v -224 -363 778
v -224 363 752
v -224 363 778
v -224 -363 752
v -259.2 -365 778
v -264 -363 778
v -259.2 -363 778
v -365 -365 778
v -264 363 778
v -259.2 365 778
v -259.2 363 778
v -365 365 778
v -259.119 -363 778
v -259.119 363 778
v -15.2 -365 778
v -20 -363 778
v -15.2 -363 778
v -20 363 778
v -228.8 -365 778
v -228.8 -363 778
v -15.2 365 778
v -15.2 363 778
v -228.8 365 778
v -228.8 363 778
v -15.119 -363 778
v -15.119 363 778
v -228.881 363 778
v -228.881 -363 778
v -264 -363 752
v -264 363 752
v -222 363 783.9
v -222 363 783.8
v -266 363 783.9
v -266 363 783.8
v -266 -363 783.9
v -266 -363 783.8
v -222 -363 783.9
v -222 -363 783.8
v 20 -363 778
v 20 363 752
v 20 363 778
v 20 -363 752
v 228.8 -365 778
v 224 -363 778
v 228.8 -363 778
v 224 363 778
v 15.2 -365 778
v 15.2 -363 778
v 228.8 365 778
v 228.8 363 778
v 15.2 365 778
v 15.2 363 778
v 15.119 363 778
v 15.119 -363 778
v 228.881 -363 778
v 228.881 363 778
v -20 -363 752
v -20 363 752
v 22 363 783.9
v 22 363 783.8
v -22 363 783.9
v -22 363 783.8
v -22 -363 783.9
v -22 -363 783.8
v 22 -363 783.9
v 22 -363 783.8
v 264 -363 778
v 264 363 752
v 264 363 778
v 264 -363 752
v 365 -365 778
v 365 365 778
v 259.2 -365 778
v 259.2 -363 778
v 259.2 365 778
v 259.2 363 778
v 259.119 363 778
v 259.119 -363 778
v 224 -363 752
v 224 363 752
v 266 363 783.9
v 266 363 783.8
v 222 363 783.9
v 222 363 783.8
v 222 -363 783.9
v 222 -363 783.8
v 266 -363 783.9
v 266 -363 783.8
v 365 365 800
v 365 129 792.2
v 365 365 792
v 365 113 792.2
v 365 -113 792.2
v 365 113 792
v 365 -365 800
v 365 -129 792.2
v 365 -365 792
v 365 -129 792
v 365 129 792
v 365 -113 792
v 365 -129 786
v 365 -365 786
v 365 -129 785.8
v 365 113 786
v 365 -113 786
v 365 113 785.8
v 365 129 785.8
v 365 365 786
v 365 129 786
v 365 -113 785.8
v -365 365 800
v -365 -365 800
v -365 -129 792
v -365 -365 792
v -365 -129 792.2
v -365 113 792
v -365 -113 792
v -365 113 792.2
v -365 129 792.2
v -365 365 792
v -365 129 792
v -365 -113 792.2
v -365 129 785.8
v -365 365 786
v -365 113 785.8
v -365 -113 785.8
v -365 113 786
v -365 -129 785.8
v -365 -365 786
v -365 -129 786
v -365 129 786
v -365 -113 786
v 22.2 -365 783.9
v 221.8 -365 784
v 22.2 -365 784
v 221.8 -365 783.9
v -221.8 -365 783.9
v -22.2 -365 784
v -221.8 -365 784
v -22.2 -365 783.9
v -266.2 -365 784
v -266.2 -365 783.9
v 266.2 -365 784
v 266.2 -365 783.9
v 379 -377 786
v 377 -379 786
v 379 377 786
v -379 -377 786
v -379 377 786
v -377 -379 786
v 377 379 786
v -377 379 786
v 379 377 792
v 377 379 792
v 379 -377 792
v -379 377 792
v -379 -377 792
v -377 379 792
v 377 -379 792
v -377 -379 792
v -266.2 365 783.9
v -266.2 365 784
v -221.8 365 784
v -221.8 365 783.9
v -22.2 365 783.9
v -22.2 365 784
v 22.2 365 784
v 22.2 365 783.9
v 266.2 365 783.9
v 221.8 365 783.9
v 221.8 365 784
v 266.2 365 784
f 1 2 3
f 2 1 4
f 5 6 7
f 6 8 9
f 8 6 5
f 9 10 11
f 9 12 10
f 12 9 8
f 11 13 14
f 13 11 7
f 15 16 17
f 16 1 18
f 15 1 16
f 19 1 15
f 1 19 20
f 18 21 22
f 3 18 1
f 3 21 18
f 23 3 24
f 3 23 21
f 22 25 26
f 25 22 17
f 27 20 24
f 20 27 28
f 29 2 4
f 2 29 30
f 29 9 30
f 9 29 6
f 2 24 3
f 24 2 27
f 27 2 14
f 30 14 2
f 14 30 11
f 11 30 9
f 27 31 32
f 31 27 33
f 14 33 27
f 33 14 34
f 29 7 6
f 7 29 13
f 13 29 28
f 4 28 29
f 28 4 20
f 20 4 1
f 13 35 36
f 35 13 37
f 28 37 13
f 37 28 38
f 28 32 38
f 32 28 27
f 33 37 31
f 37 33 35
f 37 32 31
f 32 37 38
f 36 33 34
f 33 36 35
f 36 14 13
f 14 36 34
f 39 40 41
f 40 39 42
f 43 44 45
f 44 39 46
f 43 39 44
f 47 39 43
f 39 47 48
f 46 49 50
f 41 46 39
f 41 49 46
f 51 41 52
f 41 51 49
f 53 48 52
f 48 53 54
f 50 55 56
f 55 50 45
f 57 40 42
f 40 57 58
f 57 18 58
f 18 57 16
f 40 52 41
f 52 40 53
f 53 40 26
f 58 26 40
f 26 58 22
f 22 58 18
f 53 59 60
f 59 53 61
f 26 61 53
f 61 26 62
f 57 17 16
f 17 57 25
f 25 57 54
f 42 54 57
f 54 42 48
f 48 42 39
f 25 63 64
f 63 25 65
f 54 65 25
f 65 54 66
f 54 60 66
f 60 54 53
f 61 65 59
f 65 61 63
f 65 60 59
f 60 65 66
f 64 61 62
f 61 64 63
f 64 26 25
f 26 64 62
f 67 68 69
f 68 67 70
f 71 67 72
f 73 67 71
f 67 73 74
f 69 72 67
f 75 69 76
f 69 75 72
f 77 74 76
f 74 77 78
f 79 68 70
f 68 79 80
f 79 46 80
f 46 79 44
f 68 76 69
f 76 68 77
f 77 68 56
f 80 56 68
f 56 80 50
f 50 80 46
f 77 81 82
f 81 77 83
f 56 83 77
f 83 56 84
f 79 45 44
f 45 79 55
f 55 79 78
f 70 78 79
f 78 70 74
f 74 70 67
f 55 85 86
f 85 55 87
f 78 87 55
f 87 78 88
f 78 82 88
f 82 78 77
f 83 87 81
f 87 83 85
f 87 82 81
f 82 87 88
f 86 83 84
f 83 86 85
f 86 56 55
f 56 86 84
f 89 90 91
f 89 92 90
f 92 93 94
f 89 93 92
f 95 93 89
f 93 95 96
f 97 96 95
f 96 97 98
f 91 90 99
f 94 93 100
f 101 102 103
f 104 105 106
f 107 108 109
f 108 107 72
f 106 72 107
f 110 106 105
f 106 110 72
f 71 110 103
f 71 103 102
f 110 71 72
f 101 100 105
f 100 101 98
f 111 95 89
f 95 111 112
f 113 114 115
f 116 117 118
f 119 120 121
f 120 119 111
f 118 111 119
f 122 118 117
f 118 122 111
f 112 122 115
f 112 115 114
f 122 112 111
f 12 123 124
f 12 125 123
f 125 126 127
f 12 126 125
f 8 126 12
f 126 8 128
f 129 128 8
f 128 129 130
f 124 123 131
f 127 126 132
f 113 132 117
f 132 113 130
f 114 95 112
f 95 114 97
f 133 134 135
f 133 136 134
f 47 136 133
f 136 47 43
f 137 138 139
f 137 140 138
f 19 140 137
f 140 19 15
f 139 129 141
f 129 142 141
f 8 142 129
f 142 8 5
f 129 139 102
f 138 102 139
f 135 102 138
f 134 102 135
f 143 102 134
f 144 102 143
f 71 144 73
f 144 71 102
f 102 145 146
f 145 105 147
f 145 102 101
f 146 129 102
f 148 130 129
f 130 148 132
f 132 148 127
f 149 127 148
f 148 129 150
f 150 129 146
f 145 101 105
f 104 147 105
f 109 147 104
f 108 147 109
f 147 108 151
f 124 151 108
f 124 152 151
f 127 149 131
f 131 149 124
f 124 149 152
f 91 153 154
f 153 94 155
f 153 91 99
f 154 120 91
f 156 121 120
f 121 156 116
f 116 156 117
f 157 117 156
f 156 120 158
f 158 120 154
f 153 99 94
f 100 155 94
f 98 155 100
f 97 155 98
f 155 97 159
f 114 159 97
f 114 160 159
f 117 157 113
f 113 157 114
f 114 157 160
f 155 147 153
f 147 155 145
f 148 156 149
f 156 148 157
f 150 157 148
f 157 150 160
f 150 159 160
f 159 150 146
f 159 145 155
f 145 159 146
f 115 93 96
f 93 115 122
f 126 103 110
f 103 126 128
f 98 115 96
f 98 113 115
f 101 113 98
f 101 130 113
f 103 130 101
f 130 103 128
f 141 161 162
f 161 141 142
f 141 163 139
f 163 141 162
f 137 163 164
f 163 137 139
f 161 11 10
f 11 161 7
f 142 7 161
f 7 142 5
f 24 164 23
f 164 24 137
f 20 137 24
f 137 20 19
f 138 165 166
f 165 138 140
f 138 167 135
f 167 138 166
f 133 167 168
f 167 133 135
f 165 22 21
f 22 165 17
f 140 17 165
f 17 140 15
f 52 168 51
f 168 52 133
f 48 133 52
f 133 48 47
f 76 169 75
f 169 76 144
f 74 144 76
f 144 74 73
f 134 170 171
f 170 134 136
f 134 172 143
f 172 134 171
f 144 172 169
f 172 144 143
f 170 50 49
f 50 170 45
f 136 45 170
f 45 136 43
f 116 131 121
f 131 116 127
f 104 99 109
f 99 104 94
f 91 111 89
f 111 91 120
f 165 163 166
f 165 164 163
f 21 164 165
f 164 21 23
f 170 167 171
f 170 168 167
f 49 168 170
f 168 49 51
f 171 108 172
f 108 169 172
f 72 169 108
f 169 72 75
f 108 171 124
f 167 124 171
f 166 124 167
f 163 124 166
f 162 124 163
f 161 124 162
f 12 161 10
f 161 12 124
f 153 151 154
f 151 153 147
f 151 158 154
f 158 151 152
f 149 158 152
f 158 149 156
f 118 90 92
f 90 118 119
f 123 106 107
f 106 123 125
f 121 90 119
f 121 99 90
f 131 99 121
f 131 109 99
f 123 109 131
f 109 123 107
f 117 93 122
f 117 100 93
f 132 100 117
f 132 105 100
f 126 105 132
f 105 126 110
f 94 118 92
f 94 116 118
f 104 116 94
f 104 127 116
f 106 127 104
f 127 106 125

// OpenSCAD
// file: parts.scad
$fn=40;

// ---- 桌腿 ----

module leg(){
  difference(){
    union(){
      translate([390.000,390.000,0.000]) cube([60.000,60.000,750.000]);
      translate([400.000,400.000,750.000]) cube([40.000,40.000,20.000]);
    }
    // 牙板透榫槽（沿 +x，+y 侧牙板 A 端穿入）
    translate([389.000,426.800,699.800]) cube([62.000,14.400,40.400]);
    // 牙板闷榫槽（沿 +y，+x 侧牙板 B 端）
    translate([426.800,389.000,699.800]) cube([14.400,23.200,40.400]);
  }
}

// ---- 边框 ----

module rail(){
  difference(){
    union(){
      translate([0,0,750]) linear_extrude(height=50) polygon(points=[[-370,370],[370,370],[450.0,450.0],[-450.0,450.0]]);
      translate([420.607,399.393,779.0]) rotate([0,0,-45]) cube([34,40,10],center=true);
    }
    // 面板槽：全长开通至 45° 端面（角部两框的槽合起来成 L 形）
    translate([-450.000,370.000,785.800]) cube([900.000,14.000,6.400]);
    // 腿顶榫卯（两端各半，合起来 40x40x20）
    translate([399.800,399.800,750.000]) cube([40.400,40.400,20.400]);
    translate([-440.200,399.800,750.000]) cube([40.400,40.400,20.400]);
    // 格角暗榫卯
    translate([-398.545,421.455,779.0]) rotate([0,0,45]) cube([34.4,40.4,10.4],center=true);
    // 竹销孔：+x 端穿暗榫，-x 端穿本体
    translate([418,384,750]) cylinder(h=34,r=4.0,$fn=40);
    translate([-384,418,750]) cylinder(h=34,r=4.0,$fn=40);
  }
}

// ---- 牙板 ----

module apron(){
  difference(){
    union(){
      translate([-390.000,424.000,680.000]) cube([780.000,20.000,70.000]);
      // A 端：透榫（390..460）
      translate([390.000,427.000,700.000]) cube([70.000,14.000,40.000]);
      // B 端：闷榫（-412..-390）
      translate([-412.000,427.000,700.000]) cube([22.000,14.000,40.000]);
    }
    hull(){ translate([375.000,423.500,680.000]) cube([15.000,21.000,0.200]); translate([389.800,423.500,680.000]) cube([0.200,21.000,15.000]); }
    hull(){ translate([-390.000,423.500,680.000]) cube([15.000,21.000,0.200]); translate([-390.000,423.500,680.000]) cube([0.200,21.000,15.000]); }
    // 透榫楔槽（横槽，撑开榫头上下两片）
    translate([428.000,426.900,718.400]) cube([32.200,14.200,3.200]);
  }
}

// ---- 面板-边板 ----

module panel_outer(){
  difference(){
    union(){
      translate([-365.000,-365.000,778.000]) cube([730.000,244.000,22.000]);
      translate([0,0,786]) linear_extrude(height=6) polygon(points=[[-379,-121],[-379,-377],[-377,-379],[377,-379],[379,-377],[379,-121],[365,-121],[365,-365],[-365,-365],[-365,-121]]);
    }
    // 内侧龙凤榫槽（向板内 8 深：y -129..-121）
    translate([-365.000,-129.000,785.800]) cube([730.000,8.000,6.400]);
    // 穿带燕尾槽
    hull(){ translate([-259.200,-365.000,778.000]) cube([30.400,244.000,0.100]); translate([-266.200,-365.000,783.900]) cube([44.400,244.000,0.100]); }
    hull(){ translate([-15.200,-365.000,778.000]) cube([30.400,244.000,0.100]); translate([-22.200,-365.000,783.900]) cube([44.400,244.000,0.100]); }
    hull(){ translate([228.800,-365.000,778.000]) cube([30.400,244.000,0.100]); translate([221.800,-365.000,783.900]) cube([44.400,244.000,0.100]); }
  }
}

// ---- 面板-中板 ----

module panel_middle(){
  difference(){
    union(){
      translate([-365.000,-121.000,778.000]) cube([730.000,242.000,22.000]);
      translate([365.000,-121.000,786.000]) cube([14.000,242.000,6.000]);
      translate([-379.000,-121.000,786.000]) cube([14.000,242.000,6.000]);
    }
    // 两侧龙凤榫槽（各向板内 8 深）
    translate([-365.000,-121.000,785.800]) cube([730.000,8.000,6.400]);
    translate([-365.000,113.000,785.800]) cube([730.000,8.000,6.400]);
    hull(){ translate([-259.200,-121.000,778.000]) cube([30.400,242.000,0.100]); translate([-266.200,-121.000,783.900]) cube([44.400,242.000,0.100]); }
    hull(){ translate([-15.200,-121.000,778.000]) cube([30.400,242.000,0.100]); translate([-22.200,-121.000,783.900]) cube([44.400,242.000,0.100]); }
    hull(){ translate([228.800,-121.000,778.000]) cube([30.400,242.000,0.100]); translate([221.800,-121.000,783.900]) cube([44.400,242.000,0.100]); }
  }
}

// ---- 穿带 ----

module cleat(){
  union(){
    translate([-20.000,-363.000,752.000]) cube([40.000,726.000,26.000]);
    hull(){
      translate([-15.000,-363.000,777.900]) cube([30.000,726.000,0.050]);
      translate([-22.000,-363.000,783.800]) cube([44.000,726.000,0.100]);
    }
  }
}

// ---- 穿簧 ----
module spline(){ translate([-360.000,-7.800,786.100]) cube([720.000,15.600,5.800]); }
// ---- 木楔 ----
module wedge(){ hull(){ translate([435.000,427.400,719.400]) cube([1.000,13.200,1.200]); translate([467.000,427.400,718.500]) cube([1.000,13.200,3.000]); } }
// ---- 竹销 ----
module pin(){ translate([0,0,750]) cylinder(h=34,r=4.0,$fn=40); }
// main file
include <parts.scad>
color([0.62,0.44,0.26]) translate([-244,0,0]) rotate([0,0,0]) cleat();color([0.62,0.44,0.26]) translate([0,0,0]) rotate([0,0,0]) cleat();color([0.62,0.44,0.26]) translate([244,0,0]) rotate([0,0,0]) cleat();color([0.82,0.66,0.45]) translate([0,0,0]) rotate([0,0,0]) panel_outer();color([0.82,0.66,0.45]) translate([0,0,0]) rotate([0,0,180]) panel_outer();color([0.85,0.70,0.49]) translate([0,0,0]) rotate([0,0,0]) panel_middle();
